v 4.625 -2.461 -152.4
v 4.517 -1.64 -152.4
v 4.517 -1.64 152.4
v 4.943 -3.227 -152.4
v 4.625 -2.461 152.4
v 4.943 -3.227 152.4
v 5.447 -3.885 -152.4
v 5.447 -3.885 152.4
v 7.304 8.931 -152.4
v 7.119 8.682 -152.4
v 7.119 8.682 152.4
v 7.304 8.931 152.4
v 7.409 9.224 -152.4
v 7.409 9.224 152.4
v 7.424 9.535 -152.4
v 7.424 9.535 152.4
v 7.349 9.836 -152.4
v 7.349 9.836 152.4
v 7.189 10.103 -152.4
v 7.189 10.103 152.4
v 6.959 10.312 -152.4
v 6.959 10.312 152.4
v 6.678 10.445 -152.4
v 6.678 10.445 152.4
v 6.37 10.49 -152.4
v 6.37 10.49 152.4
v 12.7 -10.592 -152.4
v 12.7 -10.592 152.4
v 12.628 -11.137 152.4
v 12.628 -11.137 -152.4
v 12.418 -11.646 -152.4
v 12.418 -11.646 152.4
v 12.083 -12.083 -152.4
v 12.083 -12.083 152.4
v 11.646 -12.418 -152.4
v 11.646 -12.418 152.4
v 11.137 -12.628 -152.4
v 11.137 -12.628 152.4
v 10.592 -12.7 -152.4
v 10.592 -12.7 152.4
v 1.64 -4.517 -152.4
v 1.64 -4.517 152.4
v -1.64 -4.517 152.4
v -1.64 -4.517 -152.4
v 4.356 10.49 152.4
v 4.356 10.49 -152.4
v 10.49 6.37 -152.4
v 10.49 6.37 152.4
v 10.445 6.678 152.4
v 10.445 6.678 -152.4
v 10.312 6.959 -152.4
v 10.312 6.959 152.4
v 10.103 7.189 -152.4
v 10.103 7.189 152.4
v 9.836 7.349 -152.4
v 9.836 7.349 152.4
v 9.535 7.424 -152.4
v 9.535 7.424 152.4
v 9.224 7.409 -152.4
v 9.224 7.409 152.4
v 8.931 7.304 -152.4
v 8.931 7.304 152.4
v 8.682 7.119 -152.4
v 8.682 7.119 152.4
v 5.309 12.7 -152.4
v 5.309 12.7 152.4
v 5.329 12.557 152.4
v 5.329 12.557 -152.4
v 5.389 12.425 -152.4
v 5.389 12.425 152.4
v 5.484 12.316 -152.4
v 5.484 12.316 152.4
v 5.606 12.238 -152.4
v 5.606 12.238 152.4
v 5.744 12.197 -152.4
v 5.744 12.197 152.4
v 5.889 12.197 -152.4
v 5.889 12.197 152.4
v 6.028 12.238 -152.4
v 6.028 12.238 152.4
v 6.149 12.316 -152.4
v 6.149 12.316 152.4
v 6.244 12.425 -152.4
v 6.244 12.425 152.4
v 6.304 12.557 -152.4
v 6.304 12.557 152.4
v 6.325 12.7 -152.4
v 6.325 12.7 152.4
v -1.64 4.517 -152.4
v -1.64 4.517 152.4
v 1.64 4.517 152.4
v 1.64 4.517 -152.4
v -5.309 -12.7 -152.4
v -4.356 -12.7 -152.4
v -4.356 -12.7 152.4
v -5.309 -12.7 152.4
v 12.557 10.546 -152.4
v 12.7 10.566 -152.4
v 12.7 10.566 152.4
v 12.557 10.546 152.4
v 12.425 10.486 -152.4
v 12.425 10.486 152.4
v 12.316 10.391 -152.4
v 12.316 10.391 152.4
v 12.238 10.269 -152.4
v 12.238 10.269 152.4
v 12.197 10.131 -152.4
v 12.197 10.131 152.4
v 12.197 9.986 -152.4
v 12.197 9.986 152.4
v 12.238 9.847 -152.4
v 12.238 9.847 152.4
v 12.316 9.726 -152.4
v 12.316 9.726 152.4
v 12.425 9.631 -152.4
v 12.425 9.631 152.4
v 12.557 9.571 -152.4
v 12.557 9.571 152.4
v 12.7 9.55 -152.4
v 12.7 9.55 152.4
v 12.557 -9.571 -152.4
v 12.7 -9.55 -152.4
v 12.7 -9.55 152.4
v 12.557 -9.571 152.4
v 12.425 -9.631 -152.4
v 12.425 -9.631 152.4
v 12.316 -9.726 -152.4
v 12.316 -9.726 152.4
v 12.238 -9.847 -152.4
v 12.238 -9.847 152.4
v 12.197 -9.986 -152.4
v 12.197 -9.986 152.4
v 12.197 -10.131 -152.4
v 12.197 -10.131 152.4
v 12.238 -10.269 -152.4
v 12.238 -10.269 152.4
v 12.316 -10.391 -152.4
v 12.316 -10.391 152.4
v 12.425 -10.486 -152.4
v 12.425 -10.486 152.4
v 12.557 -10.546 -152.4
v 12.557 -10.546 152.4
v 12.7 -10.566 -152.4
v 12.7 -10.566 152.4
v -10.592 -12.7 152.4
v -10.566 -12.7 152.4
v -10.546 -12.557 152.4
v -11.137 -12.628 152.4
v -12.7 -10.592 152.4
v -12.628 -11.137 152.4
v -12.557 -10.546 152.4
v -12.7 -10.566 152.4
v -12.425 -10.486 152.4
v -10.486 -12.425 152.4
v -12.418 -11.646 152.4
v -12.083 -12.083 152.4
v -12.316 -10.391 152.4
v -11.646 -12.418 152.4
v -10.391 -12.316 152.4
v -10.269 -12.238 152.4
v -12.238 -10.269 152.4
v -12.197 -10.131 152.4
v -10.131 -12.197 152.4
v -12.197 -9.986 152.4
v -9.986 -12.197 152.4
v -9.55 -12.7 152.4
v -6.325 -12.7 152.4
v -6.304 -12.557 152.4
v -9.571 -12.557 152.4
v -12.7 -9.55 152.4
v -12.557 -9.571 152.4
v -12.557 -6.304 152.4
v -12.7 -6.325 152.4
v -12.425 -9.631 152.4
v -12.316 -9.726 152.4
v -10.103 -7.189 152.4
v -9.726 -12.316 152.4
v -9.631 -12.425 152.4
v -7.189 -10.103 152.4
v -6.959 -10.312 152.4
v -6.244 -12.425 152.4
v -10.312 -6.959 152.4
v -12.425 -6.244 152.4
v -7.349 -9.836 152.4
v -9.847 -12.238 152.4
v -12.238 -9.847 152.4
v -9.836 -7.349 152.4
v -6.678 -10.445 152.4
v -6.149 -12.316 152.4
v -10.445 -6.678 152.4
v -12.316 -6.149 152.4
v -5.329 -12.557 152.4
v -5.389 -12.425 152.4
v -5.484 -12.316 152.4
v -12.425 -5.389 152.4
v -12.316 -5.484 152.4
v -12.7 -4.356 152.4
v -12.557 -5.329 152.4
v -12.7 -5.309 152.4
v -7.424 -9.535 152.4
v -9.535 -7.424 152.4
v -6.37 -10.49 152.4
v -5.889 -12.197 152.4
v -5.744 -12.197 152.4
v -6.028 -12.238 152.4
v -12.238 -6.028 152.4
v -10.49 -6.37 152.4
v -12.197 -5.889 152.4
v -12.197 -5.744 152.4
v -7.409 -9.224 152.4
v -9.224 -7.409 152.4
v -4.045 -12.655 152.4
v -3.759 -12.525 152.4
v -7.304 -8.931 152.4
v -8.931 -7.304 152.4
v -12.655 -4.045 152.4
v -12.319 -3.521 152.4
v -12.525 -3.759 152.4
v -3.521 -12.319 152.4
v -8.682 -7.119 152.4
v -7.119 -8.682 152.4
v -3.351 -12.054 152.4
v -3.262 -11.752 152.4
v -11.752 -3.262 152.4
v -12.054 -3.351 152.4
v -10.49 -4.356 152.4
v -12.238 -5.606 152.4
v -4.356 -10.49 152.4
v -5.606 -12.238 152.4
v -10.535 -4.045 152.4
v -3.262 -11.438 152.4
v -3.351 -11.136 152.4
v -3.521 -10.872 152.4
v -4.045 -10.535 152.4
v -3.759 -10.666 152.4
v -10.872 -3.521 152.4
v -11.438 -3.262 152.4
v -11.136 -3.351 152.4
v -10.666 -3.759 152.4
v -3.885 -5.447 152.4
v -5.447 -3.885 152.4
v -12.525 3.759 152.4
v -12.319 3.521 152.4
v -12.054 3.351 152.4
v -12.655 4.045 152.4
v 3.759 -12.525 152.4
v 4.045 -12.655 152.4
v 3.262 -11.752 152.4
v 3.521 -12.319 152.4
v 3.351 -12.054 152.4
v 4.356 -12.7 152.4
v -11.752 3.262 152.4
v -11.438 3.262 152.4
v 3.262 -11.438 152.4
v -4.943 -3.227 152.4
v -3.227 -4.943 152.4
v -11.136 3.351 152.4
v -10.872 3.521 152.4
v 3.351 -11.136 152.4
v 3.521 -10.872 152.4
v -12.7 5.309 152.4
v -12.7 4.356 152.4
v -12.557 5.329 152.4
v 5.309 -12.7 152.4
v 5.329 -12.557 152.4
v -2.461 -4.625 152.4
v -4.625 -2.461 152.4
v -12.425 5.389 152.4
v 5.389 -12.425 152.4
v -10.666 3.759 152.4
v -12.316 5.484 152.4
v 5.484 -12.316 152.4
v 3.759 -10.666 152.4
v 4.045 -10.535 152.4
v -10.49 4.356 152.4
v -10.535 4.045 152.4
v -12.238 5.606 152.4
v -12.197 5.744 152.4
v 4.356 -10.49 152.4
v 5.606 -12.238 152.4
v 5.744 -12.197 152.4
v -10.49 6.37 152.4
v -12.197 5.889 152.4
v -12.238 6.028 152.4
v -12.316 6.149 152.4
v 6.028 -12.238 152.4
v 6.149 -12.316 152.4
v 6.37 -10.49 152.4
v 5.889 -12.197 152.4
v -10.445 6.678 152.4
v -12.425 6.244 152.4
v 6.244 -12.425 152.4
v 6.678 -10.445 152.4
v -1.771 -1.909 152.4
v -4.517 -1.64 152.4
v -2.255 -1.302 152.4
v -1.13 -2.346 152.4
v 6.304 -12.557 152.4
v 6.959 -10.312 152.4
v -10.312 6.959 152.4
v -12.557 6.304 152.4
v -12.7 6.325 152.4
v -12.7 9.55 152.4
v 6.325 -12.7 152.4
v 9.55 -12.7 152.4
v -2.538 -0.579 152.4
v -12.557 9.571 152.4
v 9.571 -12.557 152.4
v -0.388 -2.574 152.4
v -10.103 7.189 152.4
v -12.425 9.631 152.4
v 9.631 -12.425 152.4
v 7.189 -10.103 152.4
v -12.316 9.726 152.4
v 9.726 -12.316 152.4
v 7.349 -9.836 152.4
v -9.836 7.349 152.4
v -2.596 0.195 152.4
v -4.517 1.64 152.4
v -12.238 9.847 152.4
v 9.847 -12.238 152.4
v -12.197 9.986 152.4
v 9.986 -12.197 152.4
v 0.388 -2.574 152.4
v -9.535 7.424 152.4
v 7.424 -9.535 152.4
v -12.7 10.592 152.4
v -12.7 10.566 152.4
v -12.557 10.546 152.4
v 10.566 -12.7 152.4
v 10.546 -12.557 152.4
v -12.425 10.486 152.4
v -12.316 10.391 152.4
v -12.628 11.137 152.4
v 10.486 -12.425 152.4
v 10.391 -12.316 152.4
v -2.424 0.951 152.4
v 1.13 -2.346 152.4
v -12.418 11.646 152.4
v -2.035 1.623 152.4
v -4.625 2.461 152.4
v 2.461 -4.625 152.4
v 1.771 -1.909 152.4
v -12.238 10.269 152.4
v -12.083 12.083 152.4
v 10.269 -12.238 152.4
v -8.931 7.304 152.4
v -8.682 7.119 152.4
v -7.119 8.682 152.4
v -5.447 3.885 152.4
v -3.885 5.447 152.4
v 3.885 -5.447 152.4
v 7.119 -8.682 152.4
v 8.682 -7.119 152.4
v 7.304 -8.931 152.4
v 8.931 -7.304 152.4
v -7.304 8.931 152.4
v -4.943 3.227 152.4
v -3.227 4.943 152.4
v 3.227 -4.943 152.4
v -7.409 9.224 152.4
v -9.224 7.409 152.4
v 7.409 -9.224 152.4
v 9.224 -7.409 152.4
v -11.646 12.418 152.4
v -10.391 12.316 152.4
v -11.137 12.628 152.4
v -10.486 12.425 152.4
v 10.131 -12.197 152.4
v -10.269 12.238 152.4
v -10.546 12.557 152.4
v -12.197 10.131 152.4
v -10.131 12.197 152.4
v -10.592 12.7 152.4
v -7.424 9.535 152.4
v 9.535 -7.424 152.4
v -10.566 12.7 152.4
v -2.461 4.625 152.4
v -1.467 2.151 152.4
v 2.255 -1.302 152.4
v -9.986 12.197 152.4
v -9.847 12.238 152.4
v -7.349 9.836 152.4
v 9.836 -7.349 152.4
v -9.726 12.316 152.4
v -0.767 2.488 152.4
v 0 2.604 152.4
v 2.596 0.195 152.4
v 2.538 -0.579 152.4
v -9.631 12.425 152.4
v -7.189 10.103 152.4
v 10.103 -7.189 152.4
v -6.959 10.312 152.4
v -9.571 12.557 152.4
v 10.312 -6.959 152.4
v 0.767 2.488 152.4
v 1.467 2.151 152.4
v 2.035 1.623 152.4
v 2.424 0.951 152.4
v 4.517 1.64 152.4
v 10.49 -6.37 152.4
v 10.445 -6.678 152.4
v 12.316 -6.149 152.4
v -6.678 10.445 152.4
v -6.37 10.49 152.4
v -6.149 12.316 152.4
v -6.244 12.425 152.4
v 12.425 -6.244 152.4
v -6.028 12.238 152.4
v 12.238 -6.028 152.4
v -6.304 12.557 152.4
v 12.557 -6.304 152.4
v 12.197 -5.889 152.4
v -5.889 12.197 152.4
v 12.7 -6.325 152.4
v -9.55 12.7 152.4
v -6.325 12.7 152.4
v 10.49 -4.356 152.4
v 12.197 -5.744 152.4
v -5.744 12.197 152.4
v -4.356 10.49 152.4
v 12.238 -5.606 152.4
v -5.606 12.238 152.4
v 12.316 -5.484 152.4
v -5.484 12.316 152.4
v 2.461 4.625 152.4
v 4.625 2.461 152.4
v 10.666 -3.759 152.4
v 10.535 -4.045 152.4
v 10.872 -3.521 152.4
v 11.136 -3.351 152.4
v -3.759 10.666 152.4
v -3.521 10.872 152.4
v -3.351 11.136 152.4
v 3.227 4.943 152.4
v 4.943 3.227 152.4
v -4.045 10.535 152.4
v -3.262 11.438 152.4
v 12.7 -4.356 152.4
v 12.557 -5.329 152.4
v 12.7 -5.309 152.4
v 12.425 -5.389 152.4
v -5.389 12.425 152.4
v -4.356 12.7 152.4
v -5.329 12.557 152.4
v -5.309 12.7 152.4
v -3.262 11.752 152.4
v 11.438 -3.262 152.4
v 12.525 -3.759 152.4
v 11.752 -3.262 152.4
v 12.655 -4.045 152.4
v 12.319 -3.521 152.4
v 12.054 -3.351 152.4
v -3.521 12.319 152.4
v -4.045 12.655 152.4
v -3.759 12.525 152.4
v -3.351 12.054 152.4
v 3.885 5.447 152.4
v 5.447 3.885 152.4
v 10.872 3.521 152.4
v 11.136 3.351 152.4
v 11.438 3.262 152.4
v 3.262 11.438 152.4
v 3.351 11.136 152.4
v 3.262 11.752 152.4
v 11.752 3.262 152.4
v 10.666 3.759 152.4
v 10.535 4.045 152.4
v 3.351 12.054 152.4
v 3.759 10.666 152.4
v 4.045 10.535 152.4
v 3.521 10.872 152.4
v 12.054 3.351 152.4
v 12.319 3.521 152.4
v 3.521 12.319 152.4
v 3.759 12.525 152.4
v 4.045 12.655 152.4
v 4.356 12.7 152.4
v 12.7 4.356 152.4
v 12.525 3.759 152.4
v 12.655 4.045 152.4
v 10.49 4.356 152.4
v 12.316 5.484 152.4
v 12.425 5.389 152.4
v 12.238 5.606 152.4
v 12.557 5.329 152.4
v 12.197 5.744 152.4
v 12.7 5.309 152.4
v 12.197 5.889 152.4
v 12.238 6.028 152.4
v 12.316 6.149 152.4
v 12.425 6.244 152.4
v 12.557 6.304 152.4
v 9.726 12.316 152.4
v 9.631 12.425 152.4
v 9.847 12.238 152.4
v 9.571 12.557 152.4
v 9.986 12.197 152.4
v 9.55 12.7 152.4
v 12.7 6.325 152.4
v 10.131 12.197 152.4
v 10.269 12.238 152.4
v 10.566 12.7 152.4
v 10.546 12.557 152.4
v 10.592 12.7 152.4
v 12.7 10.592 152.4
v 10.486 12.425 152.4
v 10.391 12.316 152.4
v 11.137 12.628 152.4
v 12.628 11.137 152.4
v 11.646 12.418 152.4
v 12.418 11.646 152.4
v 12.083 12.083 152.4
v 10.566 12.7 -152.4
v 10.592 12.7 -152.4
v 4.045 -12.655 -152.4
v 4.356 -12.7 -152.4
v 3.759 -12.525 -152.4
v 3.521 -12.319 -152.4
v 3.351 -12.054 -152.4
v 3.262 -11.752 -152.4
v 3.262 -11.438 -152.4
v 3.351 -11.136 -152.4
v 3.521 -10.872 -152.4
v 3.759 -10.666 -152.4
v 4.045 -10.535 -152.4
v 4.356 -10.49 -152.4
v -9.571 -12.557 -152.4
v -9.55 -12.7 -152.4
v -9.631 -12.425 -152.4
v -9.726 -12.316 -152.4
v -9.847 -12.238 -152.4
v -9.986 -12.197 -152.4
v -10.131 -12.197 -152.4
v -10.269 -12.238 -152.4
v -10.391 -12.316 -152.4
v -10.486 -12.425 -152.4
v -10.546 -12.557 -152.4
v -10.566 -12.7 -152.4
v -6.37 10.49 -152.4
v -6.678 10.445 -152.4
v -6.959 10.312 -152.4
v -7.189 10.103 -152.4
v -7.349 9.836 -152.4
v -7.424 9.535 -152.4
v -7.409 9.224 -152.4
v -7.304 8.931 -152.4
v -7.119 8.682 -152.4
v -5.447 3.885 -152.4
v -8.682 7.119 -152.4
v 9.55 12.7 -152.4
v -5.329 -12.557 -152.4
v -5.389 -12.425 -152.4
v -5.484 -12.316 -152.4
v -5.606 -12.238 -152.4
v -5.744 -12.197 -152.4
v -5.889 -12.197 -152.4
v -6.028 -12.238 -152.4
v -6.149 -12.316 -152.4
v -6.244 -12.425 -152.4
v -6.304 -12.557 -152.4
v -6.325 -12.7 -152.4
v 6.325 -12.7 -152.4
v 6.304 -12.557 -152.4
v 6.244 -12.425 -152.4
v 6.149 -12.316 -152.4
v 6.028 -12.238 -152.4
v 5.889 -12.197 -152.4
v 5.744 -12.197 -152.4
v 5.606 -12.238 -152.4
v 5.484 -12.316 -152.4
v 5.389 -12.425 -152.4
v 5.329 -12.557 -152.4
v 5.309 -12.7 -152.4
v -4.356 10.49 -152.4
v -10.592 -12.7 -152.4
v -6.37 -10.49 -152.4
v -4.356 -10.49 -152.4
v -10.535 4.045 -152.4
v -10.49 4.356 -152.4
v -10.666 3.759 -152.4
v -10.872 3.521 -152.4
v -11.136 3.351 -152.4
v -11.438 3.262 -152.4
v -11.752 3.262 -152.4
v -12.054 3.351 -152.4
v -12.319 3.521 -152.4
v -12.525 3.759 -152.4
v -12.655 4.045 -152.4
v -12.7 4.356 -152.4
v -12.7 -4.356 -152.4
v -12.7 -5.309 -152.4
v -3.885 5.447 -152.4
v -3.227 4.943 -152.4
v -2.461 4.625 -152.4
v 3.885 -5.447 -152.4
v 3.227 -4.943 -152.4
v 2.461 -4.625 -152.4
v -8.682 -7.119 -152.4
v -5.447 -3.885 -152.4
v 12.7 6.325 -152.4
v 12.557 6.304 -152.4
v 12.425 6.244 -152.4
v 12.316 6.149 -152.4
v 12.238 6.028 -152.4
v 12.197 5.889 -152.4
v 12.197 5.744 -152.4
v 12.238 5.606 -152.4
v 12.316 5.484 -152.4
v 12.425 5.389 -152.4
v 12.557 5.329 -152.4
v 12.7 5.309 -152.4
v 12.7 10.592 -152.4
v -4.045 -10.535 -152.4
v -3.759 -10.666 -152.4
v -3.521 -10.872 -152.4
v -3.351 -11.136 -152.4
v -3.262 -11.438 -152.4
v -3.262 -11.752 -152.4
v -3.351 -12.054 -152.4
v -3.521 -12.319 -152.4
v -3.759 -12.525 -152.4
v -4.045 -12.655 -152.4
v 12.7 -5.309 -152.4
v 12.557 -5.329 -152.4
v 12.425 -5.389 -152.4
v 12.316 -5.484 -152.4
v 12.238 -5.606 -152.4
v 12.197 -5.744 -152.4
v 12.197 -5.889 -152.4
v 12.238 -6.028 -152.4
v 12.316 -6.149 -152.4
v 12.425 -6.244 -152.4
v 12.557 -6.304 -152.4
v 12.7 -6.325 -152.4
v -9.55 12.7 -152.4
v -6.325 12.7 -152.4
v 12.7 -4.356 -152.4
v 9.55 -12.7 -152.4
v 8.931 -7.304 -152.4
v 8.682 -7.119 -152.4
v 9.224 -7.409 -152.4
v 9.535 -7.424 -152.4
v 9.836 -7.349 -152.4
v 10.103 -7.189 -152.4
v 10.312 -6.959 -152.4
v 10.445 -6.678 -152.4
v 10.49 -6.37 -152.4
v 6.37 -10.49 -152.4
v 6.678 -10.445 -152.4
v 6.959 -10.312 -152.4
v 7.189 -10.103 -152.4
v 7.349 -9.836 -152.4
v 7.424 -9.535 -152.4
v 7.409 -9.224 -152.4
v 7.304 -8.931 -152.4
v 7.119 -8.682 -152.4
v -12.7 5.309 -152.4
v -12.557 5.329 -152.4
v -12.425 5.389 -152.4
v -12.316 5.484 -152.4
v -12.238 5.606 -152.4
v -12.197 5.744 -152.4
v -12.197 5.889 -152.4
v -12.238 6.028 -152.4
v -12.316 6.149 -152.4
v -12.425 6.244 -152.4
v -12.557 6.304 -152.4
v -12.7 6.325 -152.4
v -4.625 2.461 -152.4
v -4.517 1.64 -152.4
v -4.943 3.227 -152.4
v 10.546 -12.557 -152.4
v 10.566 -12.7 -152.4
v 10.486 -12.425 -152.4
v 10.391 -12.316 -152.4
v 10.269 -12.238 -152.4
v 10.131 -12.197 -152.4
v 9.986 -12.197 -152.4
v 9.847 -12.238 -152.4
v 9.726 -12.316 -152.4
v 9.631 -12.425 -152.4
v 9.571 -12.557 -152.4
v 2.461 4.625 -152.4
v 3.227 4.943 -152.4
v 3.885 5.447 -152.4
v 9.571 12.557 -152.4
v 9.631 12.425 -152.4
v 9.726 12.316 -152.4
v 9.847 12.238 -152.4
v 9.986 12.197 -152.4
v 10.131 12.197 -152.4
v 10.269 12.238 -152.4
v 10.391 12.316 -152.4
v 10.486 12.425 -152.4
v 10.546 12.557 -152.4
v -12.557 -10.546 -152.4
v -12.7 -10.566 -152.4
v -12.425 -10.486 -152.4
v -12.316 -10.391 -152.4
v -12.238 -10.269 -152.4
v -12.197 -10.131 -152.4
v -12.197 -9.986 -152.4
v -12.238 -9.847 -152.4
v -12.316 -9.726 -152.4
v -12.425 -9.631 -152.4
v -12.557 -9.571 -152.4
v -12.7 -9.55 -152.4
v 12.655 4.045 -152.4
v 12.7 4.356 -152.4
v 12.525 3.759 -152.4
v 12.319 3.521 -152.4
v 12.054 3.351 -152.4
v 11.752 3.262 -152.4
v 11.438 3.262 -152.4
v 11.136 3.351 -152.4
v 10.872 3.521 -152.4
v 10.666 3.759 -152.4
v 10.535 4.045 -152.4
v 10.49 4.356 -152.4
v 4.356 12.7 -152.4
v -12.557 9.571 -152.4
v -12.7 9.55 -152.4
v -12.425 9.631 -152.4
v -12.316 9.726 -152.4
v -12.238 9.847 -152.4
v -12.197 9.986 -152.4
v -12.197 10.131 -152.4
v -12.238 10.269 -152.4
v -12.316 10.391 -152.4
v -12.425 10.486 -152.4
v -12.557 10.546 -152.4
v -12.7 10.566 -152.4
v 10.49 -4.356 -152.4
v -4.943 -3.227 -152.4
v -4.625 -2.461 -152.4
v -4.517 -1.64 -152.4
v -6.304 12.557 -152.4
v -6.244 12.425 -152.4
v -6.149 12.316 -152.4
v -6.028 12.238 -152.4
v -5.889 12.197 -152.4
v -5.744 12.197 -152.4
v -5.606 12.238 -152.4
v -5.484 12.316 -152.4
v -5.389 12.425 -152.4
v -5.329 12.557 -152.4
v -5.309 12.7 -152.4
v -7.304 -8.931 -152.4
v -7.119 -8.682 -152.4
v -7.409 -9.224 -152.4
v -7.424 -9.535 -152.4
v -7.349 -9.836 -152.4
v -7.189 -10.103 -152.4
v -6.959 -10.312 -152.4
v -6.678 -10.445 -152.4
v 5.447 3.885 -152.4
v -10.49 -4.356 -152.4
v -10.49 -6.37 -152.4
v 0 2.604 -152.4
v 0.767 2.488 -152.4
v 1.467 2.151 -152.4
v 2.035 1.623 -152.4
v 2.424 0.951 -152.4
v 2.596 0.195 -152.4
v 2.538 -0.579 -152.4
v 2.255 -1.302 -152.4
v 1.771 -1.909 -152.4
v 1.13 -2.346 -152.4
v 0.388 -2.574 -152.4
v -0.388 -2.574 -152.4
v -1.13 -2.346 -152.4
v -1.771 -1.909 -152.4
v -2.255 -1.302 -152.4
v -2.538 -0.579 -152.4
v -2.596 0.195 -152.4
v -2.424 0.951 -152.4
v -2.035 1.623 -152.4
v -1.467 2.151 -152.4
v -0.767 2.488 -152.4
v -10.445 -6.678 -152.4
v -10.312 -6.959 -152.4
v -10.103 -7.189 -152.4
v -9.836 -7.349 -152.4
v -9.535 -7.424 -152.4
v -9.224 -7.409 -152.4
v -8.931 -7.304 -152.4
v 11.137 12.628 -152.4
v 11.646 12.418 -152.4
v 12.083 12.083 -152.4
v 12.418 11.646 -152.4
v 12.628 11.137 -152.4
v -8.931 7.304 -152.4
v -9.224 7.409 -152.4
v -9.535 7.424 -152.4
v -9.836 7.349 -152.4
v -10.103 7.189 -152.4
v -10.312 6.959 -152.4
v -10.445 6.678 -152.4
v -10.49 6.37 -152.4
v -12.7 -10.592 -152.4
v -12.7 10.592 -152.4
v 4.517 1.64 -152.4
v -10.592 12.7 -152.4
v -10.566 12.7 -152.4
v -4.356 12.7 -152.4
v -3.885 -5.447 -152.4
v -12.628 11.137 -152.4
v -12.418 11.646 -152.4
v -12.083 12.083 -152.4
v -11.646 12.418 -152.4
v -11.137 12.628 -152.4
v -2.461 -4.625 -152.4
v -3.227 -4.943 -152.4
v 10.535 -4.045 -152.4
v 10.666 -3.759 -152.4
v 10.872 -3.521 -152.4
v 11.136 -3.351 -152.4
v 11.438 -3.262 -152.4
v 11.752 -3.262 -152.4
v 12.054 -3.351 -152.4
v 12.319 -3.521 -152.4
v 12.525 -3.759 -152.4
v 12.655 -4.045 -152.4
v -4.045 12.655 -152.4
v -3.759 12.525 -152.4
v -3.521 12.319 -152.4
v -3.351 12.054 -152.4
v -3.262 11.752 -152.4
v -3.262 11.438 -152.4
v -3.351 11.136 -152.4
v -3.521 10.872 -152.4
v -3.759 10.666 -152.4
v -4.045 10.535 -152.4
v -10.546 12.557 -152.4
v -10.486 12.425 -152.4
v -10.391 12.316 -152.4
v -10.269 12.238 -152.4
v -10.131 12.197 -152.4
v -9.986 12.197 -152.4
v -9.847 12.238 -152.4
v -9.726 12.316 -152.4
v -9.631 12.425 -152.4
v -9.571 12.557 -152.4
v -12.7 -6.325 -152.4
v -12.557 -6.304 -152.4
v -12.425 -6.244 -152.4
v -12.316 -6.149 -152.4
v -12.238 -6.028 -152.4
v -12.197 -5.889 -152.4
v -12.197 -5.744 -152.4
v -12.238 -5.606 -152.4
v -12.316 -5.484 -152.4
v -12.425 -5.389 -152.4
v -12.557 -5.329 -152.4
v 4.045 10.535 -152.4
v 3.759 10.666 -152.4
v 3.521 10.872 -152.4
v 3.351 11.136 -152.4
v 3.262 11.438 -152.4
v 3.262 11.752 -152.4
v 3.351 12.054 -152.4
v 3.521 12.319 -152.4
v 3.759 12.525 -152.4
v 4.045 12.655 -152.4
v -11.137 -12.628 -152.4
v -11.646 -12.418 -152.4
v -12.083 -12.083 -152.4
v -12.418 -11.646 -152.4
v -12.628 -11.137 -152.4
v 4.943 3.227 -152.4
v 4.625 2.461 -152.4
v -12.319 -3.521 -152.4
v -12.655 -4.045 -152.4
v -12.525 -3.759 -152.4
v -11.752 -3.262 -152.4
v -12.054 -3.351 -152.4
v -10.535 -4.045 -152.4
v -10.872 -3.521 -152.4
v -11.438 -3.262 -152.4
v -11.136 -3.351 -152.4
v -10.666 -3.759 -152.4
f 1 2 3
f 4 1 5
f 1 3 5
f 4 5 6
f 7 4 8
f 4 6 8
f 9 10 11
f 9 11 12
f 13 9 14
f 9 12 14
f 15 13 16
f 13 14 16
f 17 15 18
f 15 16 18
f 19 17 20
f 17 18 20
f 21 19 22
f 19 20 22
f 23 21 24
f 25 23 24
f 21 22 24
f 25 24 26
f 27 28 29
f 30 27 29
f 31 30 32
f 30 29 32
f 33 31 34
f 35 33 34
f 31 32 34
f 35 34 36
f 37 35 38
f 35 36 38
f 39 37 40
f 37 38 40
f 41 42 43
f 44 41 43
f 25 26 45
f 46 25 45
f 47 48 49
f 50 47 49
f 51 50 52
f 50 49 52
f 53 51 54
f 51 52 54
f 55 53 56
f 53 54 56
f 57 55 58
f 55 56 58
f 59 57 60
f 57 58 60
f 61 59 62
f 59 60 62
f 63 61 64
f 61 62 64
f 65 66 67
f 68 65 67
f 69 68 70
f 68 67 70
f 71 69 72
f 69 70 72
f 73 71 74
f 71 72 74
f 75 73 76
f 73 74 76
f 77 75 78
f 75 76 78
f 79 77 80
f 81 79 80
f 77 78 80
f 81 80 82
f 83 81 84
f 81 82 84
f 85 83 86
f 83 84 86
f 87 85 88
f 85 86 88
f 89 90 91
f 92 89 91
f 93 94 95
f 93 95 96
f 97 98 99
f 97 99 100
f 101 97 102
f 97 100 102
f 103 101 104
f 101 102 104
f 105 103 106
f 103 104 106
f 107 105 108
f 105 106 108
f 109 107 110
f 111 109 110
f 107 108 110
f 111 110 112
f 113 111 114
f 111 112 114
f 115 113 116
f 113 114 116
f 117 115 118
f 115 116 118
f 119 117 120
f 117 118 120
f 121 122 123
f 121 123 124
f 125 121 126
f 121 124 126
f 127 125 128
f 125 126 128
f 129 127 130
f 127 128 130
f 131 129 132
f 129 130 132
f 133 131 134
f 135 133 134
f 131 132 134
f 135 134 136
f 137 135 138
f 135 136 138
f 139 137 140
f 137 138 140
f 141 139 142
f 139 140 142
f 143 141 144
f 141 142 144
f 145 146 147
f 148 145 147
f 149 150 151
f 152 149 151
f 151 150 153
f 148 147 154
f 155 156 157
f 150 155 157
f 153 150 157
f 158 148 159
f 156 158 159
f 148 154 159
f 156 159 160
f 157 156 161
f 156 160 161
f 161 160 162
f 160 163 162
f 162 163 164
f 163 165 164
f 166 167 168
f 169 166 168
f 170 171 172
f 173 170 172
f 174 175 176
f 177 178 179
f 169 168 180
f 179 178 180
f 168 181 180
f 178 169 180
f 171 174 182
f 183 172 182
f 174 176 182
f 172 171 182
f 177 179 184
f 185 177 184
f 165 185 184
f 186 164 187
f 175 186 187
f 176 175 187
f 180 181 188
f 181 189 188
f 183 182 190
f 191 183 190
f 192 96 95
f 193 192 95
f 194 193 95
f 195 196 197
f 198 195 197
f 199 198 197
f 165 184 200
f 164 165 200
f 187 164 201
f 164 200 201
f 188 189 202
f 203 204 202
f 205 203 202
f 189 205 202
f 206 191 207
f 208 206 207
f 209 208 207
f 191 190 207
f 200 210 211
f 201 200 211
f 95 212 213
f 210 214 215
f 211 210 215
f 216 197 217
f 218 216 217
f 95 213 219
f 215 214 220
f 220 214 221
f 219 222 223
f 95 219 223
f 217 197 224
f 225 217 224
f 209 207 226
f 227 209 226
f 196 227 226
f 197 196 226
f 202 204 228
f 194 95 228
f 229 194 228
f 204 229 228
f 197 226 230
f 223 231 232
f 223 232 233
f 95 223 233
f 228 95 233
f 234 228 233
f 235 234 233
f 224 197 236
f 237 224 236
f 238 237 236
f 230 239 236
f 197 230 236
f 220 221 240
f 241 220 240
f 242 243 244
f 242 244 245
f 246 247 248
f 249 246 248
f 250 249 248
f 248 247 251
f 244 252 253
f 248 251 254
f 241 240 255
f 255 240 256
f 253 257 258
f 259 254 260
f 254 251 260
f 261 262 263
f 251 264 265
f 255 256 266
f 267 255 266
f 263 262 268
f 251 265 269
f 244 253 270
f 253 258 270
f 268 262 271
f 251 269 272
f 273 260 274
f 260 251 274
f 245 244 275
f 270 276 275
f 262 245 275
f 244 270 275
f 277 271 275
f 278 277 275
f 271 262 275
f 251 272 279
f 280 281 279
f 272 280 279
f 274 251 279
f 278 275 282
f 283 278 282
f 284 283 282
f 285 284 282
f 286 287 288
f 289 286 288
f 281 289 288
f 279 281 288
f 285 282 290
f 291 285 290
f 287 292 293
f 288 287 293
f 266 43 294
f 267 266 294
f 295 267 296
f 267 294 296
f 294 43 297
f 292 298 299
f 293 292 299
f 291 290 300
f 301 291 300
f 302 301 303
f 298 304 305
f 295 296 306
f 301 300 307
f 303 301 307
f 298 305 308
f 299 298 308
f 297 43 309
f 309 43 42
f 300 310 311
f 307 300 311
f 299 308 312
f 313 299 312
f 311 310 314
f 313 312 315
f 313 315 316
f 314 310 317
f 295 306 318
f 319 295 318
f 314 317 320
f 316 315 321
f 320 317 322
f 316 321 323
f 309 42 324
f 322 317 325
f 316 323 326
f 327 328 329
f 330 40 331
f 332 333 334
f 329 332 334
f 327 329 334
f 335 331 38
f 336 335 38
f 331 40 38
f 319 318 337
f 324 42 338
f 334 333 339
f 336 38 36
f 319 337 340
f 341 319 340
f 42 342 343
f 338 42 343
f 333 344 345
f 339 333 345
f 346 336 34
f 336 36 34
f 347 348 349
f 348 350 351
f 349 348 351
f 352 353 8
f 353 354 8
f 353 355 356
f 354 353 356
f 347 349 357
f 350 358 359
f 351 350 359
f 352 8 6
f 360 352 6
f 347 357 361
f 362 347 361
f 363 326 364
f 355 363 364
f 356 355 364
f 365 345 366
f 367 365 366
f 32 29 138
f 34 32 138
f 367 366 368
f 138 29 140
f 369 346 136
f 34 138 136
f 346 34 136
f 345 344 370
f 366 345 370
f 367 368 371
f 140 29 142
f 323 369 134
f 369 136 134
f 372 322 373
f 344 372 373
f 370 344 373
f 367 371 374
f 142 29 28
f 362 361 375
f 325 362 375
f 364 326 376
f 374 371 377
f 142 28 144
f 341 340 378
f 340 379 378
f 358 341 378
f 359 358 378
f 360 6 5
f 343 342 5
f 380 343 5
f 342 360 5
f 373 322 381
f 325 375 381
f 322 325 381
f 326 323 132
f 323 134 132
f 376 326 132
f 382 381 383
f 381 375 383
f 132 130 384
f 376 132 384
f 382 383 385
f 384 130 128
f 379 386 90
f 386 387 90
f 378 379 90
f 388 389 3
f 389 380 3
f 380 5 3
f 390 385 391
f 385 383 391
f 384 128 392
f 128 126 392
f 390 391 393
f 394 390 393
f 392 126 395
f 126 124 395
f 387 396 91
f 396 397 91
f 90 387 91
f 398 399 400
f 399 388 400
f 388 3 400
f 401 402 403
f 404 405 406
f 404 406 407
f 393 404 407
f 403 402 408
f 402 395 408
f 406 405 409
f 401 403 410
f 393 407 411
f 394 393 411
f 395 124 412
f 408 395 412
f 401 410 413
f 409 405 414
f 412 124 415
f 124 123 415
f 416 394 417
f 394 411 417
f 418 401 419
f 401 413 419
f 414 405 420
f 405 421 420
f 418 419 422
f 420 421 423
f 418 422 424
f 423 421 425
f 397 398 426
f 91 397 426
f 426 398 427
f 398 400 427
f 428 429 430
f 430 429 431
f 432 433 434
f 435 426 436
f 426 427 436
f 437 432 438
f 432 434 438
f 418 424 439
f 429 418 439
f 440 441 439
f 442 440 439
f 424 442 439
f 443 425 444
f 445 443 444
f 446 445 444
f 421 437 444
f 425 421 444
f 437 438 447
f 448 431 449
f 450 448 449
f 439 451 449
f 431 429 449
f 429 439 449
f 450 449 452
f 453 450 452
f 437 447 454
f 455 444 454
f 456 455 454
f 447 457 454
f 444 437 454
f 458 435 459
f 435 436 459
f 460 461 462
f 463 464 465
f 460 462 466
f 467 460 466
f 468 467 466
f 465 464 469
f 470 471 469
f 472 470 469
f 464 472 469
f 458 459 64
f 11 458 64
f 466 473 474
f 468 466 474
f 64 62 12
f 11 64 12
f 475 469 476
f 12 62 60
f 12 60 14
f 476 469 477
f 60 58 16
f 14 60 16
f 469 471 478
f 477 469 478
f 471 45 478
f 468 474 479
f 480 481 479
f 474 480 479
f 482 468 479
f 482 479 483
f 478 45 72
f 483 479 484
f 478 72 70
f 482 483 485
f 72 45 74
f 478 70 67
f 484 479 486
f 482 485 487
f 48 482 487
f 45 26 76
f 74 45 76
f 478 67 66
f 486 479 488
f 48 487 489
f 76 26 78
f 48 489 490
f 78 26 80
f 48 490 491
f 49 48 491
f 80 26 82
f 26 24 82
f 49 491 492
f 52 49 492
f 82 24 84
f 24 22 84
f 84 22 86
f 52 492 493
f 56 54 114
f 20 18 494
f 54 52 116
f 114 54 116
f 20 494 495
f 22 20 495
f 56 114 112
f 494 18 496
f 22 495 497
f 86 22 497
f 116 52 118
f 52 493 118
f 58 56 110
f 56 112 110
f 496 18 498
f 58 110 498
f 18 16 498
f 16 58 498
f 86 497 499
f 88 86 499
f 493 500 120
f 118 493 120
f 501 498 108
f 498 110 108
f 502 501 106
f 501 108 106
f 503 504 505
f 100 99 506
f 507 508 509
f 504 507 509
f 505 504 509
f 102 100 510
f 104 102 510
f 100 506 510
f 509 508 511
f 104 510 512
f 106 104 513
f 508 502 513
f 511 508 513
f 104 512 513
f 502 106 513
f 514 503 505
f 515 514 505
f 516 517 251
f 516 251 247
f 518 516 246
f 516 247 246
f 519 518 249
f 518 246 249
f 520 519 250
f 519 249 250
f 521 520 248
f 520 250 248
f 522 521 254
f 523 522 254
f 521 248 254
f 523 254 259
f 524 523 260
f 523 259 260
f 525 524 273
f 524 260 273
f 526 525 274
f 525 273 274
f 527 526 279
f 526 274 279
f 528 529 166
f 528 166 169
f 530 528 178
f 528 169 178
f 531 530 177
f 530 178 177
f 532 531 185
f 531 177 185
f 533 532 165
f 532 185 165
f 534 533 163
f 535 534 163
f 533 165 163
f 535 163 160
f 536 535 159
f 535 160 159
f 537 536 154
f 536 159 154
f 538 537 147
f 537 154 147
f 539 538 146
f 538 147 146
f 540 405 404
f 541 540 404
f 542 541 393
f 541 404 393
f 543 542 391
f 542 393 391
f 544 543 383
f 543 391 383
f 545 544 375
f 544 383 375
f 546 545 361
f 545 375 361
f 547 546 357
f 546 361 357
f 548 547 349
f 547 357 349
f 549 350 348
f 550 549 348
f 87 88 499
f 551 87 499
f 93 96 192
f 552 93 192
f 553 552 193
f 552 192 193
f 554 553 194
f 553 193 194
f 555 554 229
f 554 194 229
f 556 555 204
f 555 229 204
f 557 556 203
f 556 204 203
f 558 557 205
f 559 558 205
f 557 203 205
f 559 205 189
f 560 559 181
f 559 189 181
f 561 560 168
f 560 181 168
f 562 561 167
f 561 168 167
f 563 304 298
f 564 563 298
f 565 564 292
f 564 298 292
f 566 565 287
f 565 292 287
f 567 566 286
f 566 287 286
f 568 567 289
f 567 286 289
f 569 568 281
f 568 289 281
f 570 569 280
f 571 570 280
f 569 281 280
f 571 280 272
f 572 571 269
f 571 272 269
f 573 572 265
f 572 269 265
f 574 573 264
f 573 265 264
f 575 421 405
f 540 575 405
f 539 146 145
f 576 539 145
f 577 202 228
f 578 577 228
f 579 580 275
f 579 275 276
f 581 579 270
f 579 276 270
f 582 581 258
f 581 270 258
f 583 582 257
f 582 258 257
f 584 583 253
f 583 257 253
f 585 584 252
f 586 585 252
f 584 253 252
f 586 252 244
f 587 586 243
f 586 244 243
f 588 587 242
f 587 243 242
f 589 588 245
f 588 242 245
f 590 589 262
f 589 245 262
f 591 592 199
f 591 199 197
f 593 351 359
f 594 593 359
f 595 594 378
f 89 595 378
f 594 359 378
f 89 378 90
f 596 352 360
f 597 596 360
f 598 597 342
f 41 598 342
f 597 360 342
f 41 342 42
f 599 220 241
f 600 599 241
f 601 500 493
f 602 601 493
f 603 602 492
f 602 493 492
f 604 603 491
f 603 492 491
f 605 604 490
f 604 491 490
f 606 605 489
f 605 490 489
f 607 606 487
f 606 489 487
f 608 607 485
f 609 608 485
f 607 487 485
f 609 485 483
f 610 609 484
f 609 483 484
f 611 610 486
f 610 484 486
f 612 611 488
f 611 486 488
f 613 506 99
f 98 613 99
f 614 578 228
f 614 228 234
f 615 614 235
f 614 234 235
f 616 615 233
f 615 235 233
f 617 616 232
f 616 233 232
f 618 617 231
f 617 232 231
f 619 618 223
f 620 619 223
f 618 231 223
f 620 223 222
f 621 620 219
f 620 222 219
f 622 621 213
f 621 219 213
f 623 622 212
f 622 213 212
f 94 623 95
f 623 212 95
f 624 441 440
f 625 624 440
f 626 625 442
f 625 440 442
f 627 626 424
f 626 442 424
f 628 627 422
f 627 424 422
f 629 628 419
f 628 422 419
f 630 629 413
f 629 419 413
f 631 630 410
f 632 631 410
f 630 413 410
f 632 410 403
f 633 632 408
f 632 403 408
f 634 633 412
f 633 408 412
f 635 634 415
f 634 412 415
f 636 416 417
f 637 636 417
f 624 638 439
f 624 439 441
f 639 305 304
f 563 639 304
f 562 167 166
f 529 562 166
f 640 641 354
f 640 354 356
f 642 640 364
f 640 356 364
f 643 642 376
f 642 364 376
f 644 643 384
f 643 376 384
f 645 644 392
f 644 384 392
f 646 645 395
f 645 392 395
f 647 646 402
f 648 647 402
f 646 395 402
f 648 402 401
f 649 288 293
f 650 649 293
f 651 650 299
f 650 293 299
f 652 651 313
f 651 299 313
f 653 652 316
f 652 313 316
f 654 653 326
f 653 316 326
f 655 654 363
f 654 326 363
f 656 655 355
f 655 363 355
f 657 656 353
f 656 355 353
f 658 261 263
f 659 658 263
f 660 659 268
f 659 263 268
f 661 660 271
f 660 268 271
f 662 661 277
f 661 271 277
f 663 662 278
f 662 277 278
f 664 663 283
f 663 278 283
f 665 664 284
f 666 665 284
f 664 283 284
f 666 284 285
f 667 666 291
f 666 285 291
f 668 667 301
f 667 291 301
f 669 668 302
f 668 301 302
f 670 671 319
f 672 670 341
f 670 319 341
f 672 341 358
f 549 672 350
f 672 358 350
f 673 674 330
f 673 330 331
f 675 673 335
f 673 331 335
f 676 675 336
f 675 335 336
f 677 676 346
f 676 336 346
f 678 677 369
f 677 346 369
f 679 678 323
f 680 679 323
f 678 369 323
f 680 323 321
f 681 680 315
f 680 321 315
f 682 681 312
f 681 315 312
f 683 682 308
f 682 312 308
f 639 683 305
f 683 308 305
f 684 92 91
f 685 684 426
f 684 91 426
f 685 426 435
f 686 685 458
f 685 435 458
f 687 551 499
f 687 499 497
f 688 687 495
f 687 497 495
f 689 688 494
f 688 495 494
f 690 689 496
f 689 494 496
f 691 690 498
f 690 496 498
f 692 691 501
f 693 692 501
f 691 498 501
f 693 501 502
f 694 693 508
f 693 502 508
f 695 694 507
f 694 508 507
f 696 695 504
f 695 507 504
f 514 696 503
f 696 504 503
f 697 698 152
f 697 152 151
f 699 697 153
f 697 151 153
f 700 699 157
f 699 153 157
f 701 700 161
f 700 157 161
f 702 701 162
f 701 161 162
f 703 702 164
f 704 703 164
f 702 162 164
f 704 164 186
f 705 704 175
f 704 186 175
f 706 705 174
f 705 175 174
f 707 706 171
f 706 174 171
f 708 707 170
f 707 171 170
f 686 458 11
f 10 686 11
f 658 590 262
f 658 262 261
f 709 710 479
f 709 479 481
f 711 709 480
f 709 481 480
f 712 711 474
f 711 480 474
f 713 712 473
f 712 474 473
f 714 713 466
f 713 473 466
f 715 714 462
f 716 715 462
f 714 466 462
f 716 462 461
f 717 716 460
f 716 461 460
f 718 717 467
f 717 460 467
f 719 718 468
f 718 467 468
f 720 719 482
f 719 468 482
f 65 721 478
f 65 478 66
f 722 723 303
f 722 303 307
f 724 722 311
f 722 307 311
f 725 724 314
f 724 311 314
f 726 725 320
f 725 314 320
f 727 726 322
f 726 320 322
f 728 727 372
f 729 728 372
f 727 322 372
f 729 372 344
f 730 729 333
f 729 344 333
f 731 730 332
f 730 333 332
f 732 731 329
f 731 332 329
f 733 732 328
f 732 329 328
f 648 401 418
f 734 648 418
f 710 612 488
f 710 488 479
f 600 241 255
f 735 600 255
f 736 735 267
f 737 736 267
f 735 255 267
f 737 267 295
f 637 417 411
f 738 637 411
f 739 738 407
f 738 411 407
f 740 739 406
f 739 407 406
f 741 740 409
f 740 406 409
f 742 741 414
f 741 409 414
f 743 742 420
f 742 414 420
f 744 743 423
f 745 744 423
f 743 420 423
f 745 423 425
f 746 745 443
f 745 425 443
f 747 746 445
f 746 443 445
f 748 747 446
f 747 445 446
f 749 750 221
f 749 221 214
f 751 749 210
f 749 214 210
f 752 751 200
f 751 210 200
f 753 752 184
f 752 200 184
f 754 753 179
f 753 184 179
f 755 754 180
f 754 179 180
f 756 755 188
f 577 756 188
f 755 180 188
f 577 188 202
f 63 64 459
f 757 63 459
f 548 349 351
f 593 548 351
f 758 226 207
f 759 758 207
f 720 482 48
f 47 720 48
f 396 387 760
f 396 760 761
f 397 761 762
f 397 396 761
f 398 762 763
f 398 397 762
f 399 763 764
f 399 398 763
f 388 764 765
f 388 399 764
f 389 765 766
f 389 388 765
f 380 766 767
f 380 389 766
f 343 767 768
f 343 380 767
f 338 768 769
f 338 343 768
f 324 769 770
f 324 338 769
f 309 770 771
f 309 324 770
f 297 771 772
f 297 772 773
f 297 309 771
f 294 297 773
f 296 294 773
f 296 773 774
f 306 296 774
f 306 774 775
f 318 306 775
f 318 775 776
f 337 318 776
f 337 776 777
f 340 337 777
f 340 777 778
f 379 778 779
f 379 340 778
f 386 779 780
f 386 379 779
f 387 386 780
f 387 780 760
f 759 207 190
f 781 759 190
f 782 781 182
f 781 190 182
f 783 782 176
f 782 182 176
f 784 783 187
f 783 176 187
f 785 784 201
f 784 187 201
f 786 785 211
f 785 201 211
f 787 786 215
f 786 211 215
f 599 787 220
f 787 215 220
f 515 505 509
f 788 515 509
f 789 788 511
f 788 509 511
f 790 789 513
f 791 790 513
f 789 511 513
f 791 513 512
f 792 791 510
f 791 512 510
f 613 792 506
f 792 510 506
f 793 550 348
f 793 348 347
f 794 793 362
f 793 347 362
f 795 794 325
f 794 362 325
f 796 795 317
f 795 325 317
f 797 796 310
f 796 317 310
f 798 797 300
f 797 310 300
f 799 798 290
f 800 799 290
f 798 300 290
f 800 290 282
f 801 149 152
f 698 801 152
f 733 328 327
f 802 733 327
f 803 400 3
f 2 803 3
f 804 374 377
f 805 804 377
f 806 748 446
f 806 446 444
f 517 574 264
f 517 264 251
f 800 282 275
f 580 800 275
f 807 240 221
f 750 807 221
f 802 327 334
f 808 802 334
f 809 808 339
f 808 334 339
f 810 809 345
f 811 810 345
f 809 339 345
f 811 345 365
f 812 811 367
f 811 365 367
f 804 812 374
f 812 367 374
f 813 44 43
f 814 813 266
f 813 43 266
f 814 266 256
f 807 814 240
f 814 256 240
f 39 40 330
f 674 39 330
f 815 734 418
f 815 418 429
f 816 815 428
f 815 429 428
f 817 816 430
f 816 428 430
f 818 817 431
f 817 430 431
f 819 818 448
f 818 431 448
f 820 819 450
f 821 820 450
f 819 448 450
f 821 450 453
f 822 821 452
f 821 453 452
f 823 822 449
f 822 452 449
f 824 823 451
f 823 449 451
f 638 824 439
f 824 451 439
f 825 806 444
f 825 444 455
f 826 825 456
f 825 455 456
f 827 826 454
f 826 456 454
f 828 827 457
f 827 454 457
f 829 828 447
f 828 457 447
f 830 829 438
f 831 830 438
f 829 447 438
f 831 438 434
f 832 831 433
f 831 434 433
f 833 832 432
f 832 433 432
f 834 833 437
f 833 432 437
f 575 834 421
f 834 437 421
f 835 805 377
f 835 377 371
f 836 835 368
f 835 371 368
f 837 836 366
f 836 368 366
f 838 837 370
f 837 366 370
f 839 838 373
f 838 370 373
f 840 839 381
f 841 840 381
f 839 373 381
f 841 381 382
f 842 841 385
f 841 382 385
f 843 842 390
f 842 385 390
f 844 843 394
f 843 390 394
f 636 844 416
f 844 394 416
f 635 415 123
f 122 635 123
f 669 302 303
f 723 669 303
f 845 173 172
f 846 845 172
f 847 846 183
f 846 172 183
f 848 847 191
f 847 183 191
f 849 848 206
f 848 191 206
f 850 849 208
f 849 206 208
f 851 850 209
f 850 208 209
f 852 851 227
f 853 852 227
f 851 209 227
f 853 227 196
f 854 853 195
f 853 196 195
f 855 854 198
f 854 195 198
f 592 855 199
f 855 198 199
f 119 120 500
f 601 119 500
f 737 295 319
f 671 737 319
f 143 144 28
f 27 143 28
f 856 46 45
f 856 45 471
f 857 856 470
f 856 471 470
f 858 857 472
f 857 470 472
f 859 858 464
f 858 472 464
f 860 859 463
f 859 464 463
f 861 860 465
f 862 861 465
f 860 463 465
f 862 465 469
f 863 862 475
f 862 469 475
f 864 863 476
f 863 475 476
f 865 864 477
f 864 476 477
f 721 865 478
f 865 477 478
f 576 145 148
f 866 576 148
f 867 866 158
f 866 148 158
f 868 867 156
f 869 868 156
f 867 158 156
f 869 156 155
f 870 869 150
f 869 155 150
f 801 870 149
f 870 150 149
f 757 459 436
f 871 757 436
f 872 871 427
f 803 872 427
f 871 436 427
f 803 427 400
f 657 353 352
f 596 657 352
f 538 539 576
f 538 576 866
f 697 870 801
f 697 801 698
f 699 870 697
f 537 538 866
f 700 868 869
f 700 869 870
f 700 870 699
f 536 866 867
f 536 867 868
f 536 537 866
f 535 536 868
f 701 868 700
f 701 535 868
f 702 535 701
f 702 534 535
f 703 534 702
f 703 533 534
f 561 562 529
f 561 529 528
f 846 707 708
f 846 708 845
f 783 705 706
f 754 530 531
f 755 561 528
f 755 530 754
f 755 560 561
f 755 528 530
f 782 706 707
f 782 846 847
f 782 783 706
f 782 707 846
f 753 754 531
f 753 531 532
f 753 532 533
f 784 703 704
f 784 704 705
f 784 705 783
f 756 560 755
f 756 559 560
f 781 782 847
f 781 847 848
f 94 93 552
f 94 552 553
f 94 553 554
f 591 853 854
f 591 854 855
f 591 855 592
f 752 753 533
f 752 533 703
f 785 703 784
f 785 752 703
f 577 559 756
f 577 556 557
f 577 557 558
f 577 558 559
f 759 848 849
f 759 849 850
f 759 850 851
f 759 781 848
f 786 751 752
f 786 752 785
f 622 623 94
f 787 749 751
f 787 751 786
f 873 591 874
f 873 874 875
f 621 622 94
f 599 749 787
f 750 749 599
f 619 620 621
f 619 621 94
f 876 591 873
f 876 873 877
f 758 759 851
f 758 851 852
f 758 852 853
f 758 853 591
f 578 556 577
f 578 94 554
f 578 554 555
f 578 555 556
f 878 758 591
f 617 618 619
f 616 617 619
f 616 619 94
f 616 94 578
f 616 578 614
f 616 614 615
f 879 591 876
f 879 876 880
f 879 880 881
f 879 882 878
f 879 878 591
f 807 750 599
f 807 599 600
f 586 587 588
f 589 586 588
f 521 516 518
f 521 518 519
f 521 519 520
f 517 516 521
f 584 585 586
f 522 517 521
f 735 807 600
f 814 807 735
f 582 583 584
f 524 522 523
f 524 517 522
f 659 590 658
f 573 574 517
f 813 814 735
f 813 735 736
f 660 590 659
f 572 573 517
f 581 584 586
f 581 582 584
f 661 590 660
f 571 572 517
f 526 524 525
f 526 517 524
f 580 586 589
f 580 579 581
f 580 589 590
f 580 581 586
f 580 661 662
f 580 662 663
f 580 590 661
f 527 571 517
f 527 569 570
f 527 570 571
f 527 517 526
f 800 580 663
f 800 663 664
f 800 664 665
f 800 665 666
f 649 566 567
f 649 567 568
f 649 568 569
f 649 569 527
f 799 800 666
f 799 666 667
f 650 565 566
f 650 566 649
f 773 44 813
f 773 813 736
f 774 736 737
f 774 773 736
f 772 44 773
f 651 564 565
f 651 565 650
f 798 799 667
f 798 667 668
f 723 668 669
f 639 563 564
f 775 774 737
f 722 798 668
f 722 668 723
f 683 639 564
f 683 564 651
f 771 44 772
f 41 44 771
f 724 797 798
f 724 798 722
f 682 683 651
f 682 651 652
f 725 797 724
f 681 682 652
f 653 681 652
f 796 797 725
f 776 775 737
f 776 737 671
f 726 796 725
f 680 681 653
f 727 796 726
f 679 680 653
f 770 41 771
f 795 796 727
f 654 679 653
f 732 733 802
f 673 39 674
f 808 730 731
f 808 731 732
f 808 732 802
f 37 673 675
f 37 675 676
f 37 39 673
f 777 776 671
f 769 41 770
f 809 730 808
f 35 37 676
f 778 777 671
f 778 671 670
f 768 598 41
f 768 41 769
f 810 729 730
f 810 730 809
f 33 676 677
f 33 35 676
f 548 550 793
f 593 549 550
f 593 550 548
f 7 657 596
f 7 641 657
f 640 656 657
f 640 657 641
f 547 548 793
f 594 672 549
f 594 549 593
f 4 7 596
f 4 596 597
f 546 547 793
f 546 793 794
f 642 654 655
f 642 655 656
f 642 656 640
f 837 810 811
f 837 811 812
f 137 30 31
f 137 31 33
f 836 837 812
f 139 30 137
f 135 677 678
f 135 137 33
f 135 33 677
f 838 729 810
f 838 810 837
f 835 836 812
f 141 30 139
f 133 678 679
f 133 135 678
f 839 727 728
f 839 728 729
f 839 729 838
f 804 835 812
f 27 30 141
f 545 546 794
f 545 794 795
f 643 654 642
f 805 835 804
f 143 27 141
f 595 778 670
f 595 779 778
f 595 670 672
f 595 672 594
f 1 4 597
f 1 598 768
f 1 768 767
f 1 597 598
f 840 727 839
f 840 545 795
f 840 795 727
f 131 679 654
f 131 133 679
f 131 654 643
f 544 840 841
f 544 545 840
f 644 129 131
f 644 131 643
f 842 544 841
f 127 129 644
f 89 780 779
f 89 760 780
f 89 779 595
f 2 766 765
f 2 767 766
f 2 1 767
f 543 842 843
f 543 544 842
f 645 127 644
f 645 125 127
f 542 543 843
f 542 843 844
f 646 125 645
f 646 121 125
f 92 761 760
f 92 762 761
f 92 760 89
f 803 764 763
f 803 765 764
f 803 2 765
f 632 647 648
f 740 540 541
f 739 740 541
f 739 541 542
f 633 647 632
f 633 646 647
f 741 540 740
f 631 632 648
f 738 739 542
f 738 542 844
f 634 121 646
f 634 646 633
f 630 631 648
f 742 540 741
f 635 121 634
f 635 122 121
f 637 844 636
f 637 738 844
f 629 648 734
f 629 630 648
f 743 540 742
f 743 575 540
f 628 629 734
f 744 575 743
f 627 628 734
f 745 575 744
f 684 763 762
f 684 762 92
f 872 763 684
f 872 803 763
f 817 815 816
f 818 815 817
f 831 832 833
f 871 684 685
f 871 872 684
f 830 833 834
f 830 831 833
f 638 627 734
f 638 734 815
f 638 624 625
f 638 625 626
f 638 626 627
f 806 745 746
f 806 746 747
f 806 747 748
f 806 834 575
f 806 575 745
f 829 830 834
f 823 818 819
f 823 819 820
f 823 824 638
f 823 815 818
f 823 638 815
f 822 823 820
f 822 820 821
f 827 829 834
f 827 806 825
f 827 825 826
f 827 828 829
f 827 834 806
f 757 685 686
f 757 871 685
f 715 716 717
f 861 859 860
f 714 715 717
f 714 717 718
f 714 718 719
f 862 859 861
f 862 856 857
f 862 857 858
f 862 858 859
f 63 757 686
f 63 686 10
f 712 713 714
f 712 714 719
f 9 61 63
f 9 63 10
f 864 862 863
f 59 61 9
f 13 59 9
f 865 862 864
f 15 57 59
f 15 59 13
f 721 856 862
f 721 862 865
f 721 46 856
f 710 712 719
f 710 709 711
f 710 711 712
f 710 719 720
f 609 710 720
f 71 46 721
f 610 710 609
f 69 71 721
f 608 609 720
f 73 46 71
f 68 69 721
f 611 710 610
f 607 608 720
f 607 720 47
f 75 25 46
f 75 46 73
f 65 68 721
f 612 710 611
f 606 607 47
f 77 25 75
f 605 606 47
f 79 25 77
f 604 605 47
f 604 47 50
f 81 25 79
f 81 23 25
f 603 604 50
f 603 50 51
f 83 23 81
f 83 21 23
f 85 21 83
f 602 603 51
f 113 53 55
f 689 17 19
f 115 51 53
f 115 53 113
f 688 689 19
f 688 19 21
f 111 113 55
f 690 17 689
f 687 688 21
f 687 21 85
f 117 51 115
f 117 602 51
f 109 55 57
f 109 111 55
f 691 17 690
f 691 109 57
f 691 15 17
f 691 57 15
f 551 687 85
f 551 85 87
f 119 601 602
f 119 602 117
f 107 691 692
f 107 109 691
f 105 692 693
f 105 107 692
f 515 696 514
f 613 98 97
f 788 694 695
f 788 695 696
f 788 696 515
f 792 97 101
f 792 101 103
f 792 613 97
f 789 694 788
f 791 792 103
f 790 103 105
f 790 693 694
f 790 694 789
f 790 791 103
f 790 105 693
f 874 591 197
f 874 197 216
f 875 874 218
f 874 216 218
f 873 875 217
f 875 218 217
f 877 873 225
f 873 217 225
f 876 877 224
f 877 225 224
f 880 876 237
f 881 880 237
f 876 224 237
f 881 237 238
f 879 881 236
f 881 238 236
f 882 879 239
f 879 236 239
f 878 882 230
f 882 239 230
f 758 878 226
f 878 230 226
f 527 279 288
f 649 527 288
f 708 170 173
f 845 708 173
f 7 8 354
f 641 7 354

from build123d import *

# Parameters (mm, degrees)
SKETCH11_R              = 2.6035
FRACTIONAL_1010_1_DEPTH = 304.8


with BuildPart() as part:
    # Sketch11 → Fractional 1010(1) (new body)
    with BuildSketch(Plane.YX.offset(-152.4)):
        with BuildLine():
            Line((10.5918, 12.7), (10.5664, 12.7))
            ThreePointArc((10.5664, 12.7), (10.0584, 12.192), (9.5504, 12.7))
            Line((9.5504, 12.7), (6.3246, 12.7))
            ThreePointArc((6.3246, 12.7), (5.8166, 12.192), (5.3086, 12.7))
            Line((5.3086, 12.7), (4.3561, 12.7))
            ThreePointArc((4.3561, 12.7), (3.2512, 11.5951), (4.3561, 10.4902))
            Line((4.3561, 10.4902), (6.370083786, 10.4902))
            ThreePointArc((6.370083786, 10.4902), (7.348856743, 9.836204819), (7.119204175, 8.681663397))
            Line((7.119204175, 8.681663397), (3.88464389, 5.447103113))
            ThreePointArc((3.88464389, 5.447103113), (2.854599758, 4.758849627), (1.63957986, 4.517167143))
            Line((1.63957986, 4.517167143), (-1.63957986, 4.517167143))
            ThreePointArc((-1.63957986, 4.517167143), (-2.854599758, 4.758849627), (-3.88464389, 5.447103113))
            Line((-3.88464389, 5.447103113), (-7.119204175, 8.681663397))
            ThreePointArc((-7.119204175, 8.681663397), (-7.348856743, 9.836204819), (-6.370083786, 10.4902))
            Line((-6.370083786, 10.4902), (-4.3561, 10.4902))
            ThreePointArc((-4.3561, 10.4902), (-3.2512, 11.5951), (-4.3561, 12.7))
            Line((-4.3561, 12.7), (-5.3086, 12.7))
            ThreePointArc((-5.3086, 12.7), (-5.8166, 12.192), (-6.3246, 12.7))
            Line((-6.3246, 12.7), (-9.5504, 12.7))
            ThreePointArc((-9.5504, 12.7), (-10.0584, 12.192), (-10.5664, 12.7))
            Line((-10.5664, 12.7), (-10.5918, 12.7))
            ThreePointArc((-10.5918, 12.7), (-12.082522516, 12.082522516), (-12.7, 10.5918))
            Line((-12.7, 10.5918), (-12.7, 10.5664))
            ThreePointArc((-12.7, 10.5664), (-12.192, 10.0584), (-12.7, 9.5504))
            Line((-12.7, 9.5504), (-12.7, 6.3246))
            ThreePointArc((-12.7, 6.3246), (-12.192, 5.8166), (-12.7, 5.3086))
            Line((-12.7, 5.3086), (-12.7, 4.3561))
            ThreePointArc((-12.7, 4.3561), (-11.5951, 3.2512), (-10.4902, 4.3561))
            Line((-10.4902, 4.3561), (-10.4902, 6.370083786))
            ThreePointArc((-10.4902, 6.370083786), (-9.836204819, 7.348856743), (-8.681663397, 7.119204175))
            Line((-8.681663397, 7.119204175), (-5.447103113, 3.88464389))
            ThreePointArc((-5.447103113, 3.88464389), (-4.758849627, 2.854599758), (-4.517167143, 1.63957986))
            Line((-4.517167143, 1.63957986), (-4.517167143, -1.63957986))
            ThreePointArc((-4.517167143, -1.63957986), (-4.758849627, -2.854599758), (-5.447103113, -3.88464389))
            Line((-5.447103113, -3.88464389), (-8.681663397, -7.119204175))
            ThreePointArc((-8.681663397, -7.119204175), (-9.836204819, -7.348856743), (-10.4902, -6.370083786))
            Line((-10.4902, -6.370083786), (-10.4902, -4.3561))
            ThreePointArc((-10.4902, -4.3561), (-11.5951, -3.2512), (-12.7, -4.3561))
            Line((-12.7, -4.3561), (-12.7, -5.3086))
            ThreePointArc((-12.7, -5.3086), (-12.192, -5.8166), (-12.7, -6.3246))
            Line((-12.7, -6.3246), (-12.7, -9.5504))
            ThreePointArc((-12.7, -9.5504), (-12.192, -10.0584), (-12.7, -10.5664))
            Line((-12.7, -10.5664), (-12.7, -10.5918))
            ThreePointArc((-12.7, -10.5918), (-12.082522516, -12.082522516), (-10.5918, -12.7))
            Line((-10.5918, -12.7), (-10.5664, -12.7))
            ThreePointArc((-10.5664, -12.7), (-10.0584, -12.192), (-9.5504, -12.7))
            Line((-9.5504, -12.7), (-6.3246, -12.7))
            ThreePointArc((-6.3246, -12.7), (-5.8166, -12.192), (-5.3086, -12.7))
            Line((-5.3086, -12.7), (-4.3561, -12.7))
            ThreePointArc((-4.3561, -12.7), (-3.2512, -11.5951), (-4.3561, -10.4902))
            Line((-4.3561, -10.4902), (-6.370083786, -10.4902))
            ThreePointArc((-6.370083786, -10.4902), (-7.348856743, -9.836204819), (-7.119204175, -8.681663397))
            Line((-7.119204175, -8.681663397), (-3.88464389, -5.447103113))
            ThreePointArc((-3.88464389, -5.447103113), (-2.854599758, -4.758849627), (-1.63957986, -4.517167143))
            Line((-1.63957986, -4.517167143), (1.63957986, -4.517167143))
            ThreePointArc((1.63957986, -4.517167143), (2.854599758, -4.758849627), (3.88464389, -5.447103113))
            Line((3.88464389, -5.447103113), (7.119204175, -8.681663397))
            ThreePointArc((7.119204175, -8.681663397), (7.348856743, -9.836204819), (6.370083786, -10.4902))
            Line((6.370083786, -10.4902), (4.3561, -10.4902))
            ThreePointArc((4.3561, -10.4902), (3.2512, -11.5951), (4.3561, -12.7))
            Line((4.3561, -12.7), (5.3086, -12.7))
            ThreePointArc((5.3086, -12.7), (5.8166, -12.192), (6.3246, -12.7))
            Line((6.3246, -12.7), (9.5504, -12.7))
            ThreePointArc((9.5504, -12.7), (10.0584, -12.192), (10.5664, -12.7))
            Line((10.5664, -12.7), (10.5918, -12.7))
            ThreePointArc((10.5918, -12.7), (12.082522516, -12.082522516), (12.7, -10.5918))
            Line((12.7, -10.5918), (12.7, -10.5664))
            ThreePointArc((12.7, -10.5664), (12.192, -10.0584), (12.7, -9.5504))
            Line((12.7, -9.5504), (12.7, -6.3246))
            ThreePointArc((12.7, -6.3246), (12.192, -5.8166), (12.7, -5.3086))
            Line((12.7, -5.3086), (12.7, -4.3561))
            ThreePointArc((12.7, -4.3561), (11.5951, -3.2512), (10.4902, -4.3561))
            Line((10.4902, -4.3561), (10.4902, -6.370083786))
            ThreePointArc((10.4902, -6.370083786), (9.836204819, -7.348856743), (8.681663397, -7.119204175))
            Line((8.681663397, -7.119204175), (5.447103113, -3.88464389))
            ThreePointArc((5.447103113, -3.88464389), (4.758849627, -2.854599758), (4.517167143, -1.63957986))
            Line((4.517167143, -1.63957986), (4.517167143, 1.63957986))
            ThreePointArc((4.517167143, 1.63957986), (4.758849627, 2.854599758), (5.447103113, 3.88464389))
            Line((5.447103113, 3.88464389), (8.681663397, 7.119204175))
            ThreePointArc((8.681663397, 7.119204175), (9.836204819, 7.348856743), (10.4902, 6.370083786))
            Line((10.4902, 6.370083786), (10.4902, 4.3561))
            ThreePointArc((10.4902, 4.3561), (11.5951, 3.2512), (12.7, 4.3561))
            Line((12.7, 4.3561), (12.7, 5.3086))
            ThreePointArc((12.7, 5.3086), (12.192, 5.8166), (12.7, 6.3246))
            Line((12.7, 6.3246), (12.7, 9.5504))
            ThreePointArc((12.7, 9.5504), (12.192, 10.0584), (12.7, 10.5664))
            Line((12.7, 10.5664), (12.7, 10.5918))
            ThreePointArc((12.7, 10.5918), (12.082522516, 12.082522516), (10.5918, 12.7))
        make_face()
        Circle(SKETCH11_R, mode=Mode.SUBTRACT)
    extrude(amount=FRACTIONAL_1010_1_DEPTH)


solid = part.part
